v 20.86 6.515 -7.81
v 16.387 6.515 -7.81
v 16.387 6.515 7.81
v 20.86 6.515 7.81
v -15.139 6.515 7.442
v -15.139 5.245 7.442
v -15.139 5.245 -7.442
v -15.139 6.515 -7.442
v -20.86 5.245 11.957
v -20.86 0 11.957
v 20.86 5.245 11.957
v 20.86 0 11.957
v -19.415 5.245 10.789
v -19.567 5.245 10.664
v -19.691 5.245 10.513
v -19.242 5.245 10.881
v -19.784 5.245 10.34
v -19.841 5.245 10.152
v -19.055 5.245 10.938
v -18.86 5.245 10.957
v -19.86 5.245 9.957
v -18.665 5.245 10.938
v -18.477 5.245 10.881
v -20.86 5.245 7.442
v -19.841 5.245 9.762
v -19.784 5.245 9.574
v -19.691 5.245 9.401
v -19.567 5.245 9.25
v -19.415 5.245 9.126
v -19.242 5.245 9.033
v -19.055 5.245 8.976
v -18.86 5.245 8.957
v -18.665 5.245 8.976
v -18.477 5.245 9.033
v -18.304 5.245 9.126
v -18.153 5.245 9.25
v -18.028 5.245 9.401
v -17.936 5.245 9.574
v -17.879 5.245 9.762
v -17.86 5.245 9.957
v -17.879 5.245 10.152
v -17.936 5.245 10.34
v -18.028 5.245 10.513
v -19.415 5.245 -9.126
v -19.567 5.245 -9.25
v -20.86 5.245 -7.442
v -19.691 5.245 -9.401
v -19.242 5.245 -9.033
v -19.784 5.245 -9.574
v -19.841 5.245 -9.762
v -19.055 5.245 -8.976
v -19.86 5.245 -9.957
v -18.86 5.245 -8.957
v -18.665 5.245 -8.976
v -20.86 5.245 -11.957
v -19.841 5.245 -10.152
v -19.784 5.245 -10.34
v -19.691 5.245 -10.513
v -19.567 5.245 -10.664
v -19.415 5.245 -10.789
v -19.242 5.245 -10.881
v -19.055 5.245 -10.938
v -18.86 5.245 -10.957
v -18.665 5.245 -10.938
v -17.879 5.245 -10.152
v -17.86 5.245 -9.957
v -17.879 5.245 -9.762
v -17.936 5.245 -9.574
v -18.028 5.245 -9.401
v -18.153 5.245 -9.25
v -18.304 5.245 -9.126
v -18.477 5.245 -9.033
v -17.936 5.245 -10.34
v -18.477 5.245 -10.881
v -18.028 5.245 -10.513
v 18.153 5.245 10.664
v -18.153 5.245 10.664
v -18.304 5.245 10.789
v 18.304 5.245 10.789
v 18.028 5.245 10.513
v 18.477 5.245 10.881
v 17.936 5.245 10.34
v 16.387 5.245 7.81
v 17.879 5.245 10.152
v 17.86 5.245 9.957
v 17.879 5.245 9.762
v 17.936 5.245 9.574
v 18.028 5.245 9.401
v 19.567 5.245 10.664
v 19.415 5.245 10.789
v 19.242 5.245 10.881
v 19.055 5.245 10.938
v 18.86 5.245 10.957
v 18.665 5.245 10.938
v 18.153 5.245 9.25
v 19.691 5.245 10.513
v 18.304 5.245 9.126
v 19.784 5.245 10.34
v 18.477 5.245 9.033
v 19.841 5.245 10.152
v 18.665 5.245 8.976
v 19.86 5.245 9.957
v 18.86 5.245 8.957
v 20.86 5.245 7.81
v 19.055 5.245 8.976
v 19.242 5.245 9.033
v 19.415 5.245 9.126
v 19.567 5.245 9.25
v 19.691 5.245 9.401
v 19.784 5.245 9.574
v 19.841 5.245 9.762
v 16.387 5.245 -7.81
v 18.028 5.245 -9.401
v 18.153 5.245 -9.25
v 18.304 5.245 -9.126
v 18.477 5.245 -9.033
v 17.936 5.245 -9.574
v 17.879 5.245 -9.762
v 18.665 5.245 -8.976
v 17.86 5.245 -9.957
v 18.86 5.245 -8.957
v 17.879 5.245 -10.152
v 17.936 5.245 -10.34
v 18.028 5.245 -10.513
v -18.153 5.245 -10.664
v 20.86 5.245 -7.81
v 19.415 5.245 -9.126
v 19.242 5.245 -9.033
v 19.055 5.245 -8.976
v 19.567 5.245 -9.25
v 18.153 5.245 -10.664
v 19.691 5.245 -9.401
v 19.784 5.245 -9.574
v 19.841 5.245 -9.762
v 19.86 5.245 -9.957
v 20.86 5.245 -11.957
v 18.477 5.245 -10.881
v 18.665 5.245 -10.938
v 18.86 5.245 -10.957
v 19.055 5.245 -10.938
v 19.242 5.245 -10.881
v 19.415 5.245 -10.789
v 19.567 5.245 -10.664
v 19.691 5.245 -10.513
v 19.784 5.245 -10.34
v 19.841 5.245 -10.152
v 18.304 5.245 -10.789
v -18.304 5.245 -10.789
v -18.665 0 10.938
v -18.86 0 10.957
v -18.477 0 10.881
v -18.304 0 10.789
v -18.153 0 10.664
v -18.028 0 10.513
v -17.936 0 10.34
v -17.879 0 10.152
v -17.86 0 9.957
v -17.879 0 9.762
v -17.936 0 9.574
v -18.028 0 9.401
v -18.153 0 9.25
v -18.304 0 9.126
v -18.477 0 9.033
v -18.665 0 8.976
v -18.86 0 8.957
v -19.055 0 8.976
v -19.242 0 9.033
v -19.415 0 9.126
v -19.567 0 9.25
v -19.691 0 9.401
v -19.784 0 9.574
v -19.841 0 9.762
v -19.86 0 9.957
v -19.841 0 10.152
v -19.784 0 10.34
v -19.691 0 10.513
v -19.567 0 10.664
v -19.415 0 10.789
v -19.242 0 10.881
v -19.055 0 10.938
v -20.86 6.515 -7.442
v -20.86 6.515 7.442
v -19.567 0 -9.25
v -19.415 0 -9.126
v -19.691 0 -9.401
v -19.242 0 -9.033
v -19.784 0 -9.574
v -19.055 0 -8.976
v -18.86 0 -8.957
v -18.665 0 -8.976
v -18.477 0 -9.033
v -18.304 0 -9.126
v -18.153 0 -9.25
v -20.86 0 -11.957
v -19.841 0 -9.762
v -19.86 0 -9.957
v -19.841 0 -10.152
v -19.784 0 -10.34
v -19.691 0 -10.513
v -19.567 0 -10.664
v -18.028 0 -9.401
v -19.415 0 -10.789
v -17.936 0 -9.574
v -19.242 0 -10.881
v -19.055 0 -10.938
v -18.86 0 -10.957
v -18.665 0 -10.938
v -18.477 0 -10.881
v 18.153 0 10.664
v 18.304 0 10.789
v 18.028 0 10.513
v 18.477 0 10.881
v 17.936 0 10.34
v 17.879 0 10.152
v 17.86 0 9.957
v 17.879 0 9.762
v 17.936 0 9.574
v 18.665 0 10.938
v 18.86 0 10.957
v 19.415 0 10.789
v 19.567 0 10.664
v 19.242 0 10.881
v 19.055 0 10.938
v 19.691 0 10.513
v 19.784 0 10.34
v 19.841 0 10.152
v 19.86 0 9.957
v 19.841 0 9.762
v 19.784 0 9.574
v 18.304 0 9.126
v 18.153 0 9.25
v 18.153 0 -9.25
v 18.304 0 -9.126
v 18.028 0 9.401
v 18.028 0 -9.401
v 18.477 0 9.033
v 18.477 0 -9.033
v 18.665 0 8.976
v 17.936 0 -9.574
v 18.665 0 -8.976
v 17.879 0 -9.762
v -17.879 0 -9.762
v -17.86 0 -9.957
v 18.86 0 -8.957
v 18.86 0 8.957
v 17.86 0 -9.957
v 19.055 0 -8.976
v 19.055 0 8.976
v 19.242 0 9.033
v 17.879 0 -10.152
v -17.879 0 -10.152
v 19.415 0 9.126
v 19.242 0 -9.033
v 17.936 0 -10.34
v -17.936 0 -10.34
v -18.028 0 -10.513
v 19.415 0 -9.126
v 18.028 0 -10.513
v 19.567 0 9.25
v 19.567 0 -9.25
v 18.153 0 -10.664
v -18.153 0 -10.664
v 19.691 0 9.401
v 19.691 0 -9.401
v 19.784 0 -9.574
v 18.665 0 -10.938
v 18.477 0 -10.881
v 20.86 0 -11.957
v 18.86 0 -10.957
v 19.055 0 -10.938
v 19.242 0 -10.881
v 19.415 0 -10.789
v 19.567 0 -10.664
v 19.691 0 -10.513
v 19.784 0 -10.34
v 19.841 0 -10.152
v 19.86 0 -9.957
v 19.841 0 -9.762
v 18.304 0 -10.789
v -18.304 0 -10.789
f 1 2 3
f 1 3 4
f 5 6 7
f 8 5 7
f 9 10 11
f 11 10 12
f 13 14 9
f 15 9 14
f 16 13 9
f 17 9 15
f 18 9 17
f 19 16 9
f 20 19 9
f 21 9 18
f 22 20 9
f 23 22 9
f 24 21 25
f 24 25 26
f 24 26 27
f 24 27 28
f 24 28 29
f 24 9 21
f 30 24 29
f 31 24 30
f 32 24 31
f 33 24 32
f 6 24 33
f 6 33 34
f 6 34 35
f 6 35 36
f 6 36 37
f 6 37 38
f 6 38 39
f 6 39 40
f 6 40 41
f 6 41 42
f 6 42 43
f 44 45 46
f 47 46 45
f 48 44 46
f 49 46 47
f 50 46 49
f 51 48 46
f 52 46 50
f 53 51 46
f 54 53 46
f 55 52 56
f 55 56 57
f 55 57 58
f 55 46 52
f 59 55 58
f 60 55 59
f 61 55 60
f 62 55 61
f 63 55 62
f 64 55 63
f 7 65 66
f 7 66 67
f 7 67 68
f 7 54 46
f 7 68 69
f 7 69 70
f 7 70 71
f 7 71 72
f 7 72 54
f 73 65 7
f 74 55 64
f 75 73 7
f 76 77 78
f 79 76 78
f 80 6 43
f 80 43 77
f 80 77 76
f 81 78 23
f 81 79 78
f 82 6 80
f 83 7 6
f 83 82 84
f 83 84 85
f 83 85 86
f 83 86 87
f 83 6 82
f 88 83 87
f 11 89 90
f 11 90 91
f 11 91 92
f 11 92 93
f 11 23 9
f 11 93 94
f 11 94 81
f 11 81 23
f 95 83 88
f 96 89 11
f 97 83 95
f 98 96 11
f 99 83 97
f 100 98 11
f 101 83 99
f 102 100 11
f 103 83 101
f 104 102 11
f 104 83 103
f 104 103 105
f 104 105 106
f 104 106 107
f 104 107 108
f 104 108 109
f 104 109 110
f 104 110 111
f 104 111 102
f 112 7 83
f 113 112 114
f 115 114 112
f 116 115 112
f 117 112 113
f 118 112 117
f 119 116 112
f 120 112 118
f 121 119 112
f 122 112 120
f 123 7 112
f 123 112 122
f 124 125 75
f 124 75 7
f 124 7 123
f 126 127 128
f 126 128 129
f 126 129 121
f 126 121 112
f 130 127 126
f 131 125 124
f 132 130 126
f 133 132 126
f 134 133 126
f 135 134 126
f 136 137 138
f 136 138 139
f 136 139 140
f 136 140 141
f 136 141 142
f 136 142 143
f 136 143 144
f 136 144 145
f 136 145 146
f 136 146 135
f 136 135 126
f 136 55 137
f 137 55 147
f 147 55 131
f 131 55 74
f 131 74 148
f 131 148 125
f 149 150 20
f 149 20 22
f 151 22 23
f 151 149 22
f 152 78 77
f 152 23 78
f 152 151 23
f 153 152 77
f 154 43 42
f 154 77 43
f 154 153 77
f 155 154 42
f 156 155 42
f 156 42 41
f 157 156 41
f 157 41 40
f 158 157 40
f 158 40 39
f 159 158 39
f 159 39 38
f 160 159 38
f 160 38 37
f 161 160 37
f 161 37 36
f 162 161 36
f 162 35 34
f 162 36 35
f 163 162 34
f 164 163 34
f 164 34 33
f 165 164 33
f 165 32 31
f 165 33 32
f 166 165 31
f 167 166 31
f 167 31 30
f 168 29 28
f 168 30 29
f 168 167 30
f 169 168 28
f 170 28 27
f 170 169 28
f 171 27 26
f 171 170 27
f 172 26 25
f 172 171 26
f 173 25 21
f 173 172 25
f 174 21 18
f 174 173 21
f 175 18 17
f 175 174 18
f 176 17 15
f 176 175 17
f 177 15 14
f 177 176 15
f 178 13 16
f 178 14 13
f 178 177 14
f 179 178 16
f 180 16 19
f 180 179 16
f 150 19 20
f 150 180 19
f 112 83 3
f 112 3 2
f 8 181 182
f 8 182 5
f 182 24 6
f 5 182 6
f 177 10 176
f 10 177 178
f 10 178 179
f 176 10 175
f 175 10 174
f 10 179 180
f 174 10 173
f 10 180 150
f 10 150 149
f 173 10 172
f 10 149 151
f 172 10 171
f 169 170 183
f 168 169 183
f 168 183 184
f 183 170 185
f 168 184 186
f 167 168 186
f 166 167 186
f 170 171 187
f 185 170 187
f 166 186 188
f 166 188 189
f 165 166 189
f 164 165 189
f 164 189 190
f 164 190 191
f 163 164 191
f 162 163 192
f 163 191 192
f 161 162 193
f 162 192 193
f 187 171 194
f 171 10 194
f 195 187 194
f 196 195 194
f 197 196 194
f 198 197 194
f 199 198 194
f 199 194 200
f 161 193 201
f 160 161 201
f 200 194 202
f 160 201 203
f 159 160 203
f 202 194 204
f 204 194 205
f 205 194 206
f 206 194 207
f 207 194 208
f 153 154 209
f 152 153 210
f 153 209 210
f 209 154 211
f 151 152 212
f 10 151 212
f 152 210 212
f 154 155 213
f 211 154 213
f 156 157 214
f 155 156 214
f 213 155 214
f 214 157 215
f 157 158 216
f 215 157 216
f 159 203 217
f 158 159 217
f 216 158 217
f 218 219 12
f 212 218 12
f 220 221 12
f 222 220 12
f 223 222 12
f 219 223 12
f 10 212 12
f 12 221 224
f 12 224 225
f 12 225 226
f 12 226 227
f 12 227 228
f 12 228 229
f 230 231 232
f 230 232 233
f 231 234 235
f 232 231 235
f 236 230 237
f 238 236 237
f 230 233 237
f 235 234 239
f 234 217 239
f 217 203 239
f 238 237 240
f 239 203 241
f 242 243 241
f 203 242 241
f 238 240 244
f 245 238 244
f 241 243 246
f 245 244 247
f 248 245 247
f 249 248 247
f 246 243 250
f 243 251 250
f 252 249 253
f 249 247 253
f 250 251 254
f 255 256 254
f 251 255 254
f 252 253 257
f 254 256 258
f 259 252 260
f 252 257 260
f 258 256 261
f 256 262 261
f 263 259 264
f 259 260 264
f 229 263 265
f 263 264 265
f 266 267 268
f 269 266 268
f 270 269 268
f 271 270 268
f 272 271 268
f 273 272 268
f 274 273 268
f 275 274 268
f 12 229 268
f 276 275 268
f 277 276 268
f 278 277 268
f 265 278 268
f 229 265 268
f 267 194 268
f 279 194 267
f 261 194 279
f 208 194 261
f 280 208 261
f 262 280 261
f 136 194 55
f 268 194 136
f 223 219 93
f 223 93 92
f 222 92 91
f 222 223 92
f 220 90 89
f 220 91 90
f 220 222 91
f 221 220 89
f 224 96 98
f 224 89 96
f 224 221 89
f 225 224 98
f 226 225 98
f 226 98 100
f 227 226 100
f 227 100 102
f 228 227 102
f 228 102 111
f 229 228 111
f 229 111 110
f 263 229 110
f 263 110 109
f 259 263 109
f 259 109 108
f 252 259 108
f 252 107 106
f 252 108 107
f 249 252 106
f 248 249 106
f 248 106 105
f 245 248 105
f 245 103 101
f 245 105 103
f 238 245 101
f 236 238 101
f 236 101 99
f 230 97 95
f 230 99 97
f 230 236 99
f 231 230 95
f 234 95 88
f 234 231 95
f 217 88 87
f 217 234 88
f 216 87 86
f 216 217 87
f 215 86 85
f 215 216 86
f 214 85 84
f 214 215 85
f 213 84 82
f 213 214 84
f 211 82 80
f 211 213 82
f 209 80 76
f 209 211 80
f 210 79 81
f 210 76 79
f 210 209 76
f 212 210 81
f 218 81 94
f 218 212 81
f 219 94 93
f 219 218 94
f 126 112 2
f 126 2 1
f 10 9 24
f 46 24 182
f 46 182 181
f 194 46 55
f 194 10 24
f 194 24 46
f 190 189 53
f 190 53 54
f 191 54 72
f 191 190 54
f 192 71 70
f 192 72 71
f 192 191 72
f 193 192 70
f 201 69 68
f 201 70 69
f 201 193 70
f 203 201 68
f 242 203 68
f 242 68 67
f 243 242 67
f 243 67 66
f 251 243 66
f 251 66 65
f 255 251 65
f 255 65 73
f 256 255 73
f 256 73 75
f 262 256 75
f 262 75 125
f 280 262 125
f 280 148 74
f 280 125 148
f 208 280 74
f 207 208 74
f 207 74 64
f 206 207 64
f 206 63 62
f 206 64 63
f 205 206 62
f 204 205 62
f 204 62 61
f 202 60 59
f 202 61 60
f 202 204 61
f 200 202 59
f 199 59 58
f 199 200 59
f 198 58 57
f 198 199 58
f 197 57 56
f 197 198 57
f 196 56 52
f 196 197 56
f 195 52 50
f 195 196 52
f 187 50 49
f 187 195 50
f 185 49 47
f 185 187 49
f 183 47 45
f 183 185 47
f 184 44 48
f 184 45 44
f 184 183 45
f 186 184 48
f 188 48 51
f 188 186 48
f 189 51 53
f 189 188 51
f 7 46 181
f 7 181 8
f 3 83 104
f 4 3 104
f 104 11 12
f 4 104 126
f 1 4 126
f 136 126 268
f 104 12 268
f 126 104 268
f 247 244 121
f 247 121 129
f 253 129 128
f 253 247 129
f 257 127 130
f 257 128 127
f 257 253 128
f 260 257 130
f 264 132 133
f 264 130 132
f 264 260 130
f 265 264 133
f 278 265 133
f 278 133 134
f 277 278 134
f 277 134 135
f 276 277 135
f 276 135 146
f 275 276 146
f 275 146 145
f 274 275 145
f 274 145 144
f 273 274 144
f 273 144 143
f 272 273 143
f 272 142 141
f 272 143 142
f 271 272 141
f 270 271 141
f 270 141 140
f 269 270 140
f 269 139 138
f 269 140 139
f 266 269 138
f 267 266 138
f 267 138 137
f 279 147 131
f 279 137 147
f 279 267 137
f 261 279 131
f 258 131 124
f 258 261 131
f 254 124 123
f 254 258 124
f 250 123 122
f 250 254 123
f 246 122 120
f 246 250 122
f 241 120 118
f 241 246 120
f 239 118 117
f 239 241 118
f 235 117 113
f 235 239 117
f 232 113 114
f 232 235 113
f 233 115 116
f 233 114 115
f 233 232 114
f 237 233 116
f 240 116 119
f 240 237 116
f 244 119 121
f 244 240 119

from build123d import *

# Parameters (mm, degrees)
SKETCH1_W               = 41.7195
SKETCH1_H               = 23.9141
BOSS_EXTRUDE1_DEPTH     = 5.2451
CUT_EXTRUDE1_DEPTH      = 25.609170827
CUT_EXTRUDE1_DEPTH_BACK = 25.609170827
SKETCH2_R               = 1
SKETCH3_W               = 4.472619139
SKETCH3_H               = 15.621
SKETCH3_W_2             = 5.720722195
SKETCH3_H_2             = 14.8844
BOSS_EXTRUDE2_DEPTH     = 1.27


with BuildPart() as part:
    # Sketch1 → Boss-Extrude1 (new body)
    with BuildSketch(Plane(origin=(0, 0, 0), x_dir=(1, 0, 0), z_dir=(0, 1, 0))):
        Rectangle(SKETCH1_W, SKETCH1_H)
    extrude(amount=BOSS_EXTRUDE1_DEPTH)

    # Sketch2 → Cut-Extrude1 (cut, two sides: drawn at the far end of the back side and taken through both)
    with BuildSketch(Plane(origin=(0, 5.2451, 0), x_dir=(1, 0, 0), z_dir=(0, 1, 0)).offset(-CUT_EXTRUDE1_DEPTH_BACK)):
        with Locations(Location((-18.85975, 9.95705, 0), (0, 0, 270))):
            Circle(SKETCH2_R)
        with Locations(Location((18.85975, 9.95705, 0), (0, 0, 270))):
            Circle(SKETCH2_R)
        with Locations(Location((18.85975, -9.95705, 0), (0, 0, 270))):
            Circle(SKETCH2_R)
        with Locations(Location((-18.85975, -9.95705, 0), (0, 0, 270))):
            Circle(SKETCH2_R)
    extrude(amount=CUT_EXTRUDE1_DEPTH + CUT_EXTRUDE1_DEPTH_BACK, mode=Mode.SUBTRACT)

    # Sketch3 → Boss-Extrude2 (add)
    with BuildSketch(Plane(origin=(0, 5.2451, 0), x_dir=(1, 0, 0), z_dir=(0, 1, 0))):
        with Locations((18.623440431, 0)):
            Rectangle(SKETCH3_W, SKETCH3_H)
        with Locations((-17.999388903, 0)):
            Rectangle(SKETCH3_W_2, SKETCH3_H_2)
    extrude(amount=BOSS_EXTRUDE2_DEPTH)


solid = part.part
